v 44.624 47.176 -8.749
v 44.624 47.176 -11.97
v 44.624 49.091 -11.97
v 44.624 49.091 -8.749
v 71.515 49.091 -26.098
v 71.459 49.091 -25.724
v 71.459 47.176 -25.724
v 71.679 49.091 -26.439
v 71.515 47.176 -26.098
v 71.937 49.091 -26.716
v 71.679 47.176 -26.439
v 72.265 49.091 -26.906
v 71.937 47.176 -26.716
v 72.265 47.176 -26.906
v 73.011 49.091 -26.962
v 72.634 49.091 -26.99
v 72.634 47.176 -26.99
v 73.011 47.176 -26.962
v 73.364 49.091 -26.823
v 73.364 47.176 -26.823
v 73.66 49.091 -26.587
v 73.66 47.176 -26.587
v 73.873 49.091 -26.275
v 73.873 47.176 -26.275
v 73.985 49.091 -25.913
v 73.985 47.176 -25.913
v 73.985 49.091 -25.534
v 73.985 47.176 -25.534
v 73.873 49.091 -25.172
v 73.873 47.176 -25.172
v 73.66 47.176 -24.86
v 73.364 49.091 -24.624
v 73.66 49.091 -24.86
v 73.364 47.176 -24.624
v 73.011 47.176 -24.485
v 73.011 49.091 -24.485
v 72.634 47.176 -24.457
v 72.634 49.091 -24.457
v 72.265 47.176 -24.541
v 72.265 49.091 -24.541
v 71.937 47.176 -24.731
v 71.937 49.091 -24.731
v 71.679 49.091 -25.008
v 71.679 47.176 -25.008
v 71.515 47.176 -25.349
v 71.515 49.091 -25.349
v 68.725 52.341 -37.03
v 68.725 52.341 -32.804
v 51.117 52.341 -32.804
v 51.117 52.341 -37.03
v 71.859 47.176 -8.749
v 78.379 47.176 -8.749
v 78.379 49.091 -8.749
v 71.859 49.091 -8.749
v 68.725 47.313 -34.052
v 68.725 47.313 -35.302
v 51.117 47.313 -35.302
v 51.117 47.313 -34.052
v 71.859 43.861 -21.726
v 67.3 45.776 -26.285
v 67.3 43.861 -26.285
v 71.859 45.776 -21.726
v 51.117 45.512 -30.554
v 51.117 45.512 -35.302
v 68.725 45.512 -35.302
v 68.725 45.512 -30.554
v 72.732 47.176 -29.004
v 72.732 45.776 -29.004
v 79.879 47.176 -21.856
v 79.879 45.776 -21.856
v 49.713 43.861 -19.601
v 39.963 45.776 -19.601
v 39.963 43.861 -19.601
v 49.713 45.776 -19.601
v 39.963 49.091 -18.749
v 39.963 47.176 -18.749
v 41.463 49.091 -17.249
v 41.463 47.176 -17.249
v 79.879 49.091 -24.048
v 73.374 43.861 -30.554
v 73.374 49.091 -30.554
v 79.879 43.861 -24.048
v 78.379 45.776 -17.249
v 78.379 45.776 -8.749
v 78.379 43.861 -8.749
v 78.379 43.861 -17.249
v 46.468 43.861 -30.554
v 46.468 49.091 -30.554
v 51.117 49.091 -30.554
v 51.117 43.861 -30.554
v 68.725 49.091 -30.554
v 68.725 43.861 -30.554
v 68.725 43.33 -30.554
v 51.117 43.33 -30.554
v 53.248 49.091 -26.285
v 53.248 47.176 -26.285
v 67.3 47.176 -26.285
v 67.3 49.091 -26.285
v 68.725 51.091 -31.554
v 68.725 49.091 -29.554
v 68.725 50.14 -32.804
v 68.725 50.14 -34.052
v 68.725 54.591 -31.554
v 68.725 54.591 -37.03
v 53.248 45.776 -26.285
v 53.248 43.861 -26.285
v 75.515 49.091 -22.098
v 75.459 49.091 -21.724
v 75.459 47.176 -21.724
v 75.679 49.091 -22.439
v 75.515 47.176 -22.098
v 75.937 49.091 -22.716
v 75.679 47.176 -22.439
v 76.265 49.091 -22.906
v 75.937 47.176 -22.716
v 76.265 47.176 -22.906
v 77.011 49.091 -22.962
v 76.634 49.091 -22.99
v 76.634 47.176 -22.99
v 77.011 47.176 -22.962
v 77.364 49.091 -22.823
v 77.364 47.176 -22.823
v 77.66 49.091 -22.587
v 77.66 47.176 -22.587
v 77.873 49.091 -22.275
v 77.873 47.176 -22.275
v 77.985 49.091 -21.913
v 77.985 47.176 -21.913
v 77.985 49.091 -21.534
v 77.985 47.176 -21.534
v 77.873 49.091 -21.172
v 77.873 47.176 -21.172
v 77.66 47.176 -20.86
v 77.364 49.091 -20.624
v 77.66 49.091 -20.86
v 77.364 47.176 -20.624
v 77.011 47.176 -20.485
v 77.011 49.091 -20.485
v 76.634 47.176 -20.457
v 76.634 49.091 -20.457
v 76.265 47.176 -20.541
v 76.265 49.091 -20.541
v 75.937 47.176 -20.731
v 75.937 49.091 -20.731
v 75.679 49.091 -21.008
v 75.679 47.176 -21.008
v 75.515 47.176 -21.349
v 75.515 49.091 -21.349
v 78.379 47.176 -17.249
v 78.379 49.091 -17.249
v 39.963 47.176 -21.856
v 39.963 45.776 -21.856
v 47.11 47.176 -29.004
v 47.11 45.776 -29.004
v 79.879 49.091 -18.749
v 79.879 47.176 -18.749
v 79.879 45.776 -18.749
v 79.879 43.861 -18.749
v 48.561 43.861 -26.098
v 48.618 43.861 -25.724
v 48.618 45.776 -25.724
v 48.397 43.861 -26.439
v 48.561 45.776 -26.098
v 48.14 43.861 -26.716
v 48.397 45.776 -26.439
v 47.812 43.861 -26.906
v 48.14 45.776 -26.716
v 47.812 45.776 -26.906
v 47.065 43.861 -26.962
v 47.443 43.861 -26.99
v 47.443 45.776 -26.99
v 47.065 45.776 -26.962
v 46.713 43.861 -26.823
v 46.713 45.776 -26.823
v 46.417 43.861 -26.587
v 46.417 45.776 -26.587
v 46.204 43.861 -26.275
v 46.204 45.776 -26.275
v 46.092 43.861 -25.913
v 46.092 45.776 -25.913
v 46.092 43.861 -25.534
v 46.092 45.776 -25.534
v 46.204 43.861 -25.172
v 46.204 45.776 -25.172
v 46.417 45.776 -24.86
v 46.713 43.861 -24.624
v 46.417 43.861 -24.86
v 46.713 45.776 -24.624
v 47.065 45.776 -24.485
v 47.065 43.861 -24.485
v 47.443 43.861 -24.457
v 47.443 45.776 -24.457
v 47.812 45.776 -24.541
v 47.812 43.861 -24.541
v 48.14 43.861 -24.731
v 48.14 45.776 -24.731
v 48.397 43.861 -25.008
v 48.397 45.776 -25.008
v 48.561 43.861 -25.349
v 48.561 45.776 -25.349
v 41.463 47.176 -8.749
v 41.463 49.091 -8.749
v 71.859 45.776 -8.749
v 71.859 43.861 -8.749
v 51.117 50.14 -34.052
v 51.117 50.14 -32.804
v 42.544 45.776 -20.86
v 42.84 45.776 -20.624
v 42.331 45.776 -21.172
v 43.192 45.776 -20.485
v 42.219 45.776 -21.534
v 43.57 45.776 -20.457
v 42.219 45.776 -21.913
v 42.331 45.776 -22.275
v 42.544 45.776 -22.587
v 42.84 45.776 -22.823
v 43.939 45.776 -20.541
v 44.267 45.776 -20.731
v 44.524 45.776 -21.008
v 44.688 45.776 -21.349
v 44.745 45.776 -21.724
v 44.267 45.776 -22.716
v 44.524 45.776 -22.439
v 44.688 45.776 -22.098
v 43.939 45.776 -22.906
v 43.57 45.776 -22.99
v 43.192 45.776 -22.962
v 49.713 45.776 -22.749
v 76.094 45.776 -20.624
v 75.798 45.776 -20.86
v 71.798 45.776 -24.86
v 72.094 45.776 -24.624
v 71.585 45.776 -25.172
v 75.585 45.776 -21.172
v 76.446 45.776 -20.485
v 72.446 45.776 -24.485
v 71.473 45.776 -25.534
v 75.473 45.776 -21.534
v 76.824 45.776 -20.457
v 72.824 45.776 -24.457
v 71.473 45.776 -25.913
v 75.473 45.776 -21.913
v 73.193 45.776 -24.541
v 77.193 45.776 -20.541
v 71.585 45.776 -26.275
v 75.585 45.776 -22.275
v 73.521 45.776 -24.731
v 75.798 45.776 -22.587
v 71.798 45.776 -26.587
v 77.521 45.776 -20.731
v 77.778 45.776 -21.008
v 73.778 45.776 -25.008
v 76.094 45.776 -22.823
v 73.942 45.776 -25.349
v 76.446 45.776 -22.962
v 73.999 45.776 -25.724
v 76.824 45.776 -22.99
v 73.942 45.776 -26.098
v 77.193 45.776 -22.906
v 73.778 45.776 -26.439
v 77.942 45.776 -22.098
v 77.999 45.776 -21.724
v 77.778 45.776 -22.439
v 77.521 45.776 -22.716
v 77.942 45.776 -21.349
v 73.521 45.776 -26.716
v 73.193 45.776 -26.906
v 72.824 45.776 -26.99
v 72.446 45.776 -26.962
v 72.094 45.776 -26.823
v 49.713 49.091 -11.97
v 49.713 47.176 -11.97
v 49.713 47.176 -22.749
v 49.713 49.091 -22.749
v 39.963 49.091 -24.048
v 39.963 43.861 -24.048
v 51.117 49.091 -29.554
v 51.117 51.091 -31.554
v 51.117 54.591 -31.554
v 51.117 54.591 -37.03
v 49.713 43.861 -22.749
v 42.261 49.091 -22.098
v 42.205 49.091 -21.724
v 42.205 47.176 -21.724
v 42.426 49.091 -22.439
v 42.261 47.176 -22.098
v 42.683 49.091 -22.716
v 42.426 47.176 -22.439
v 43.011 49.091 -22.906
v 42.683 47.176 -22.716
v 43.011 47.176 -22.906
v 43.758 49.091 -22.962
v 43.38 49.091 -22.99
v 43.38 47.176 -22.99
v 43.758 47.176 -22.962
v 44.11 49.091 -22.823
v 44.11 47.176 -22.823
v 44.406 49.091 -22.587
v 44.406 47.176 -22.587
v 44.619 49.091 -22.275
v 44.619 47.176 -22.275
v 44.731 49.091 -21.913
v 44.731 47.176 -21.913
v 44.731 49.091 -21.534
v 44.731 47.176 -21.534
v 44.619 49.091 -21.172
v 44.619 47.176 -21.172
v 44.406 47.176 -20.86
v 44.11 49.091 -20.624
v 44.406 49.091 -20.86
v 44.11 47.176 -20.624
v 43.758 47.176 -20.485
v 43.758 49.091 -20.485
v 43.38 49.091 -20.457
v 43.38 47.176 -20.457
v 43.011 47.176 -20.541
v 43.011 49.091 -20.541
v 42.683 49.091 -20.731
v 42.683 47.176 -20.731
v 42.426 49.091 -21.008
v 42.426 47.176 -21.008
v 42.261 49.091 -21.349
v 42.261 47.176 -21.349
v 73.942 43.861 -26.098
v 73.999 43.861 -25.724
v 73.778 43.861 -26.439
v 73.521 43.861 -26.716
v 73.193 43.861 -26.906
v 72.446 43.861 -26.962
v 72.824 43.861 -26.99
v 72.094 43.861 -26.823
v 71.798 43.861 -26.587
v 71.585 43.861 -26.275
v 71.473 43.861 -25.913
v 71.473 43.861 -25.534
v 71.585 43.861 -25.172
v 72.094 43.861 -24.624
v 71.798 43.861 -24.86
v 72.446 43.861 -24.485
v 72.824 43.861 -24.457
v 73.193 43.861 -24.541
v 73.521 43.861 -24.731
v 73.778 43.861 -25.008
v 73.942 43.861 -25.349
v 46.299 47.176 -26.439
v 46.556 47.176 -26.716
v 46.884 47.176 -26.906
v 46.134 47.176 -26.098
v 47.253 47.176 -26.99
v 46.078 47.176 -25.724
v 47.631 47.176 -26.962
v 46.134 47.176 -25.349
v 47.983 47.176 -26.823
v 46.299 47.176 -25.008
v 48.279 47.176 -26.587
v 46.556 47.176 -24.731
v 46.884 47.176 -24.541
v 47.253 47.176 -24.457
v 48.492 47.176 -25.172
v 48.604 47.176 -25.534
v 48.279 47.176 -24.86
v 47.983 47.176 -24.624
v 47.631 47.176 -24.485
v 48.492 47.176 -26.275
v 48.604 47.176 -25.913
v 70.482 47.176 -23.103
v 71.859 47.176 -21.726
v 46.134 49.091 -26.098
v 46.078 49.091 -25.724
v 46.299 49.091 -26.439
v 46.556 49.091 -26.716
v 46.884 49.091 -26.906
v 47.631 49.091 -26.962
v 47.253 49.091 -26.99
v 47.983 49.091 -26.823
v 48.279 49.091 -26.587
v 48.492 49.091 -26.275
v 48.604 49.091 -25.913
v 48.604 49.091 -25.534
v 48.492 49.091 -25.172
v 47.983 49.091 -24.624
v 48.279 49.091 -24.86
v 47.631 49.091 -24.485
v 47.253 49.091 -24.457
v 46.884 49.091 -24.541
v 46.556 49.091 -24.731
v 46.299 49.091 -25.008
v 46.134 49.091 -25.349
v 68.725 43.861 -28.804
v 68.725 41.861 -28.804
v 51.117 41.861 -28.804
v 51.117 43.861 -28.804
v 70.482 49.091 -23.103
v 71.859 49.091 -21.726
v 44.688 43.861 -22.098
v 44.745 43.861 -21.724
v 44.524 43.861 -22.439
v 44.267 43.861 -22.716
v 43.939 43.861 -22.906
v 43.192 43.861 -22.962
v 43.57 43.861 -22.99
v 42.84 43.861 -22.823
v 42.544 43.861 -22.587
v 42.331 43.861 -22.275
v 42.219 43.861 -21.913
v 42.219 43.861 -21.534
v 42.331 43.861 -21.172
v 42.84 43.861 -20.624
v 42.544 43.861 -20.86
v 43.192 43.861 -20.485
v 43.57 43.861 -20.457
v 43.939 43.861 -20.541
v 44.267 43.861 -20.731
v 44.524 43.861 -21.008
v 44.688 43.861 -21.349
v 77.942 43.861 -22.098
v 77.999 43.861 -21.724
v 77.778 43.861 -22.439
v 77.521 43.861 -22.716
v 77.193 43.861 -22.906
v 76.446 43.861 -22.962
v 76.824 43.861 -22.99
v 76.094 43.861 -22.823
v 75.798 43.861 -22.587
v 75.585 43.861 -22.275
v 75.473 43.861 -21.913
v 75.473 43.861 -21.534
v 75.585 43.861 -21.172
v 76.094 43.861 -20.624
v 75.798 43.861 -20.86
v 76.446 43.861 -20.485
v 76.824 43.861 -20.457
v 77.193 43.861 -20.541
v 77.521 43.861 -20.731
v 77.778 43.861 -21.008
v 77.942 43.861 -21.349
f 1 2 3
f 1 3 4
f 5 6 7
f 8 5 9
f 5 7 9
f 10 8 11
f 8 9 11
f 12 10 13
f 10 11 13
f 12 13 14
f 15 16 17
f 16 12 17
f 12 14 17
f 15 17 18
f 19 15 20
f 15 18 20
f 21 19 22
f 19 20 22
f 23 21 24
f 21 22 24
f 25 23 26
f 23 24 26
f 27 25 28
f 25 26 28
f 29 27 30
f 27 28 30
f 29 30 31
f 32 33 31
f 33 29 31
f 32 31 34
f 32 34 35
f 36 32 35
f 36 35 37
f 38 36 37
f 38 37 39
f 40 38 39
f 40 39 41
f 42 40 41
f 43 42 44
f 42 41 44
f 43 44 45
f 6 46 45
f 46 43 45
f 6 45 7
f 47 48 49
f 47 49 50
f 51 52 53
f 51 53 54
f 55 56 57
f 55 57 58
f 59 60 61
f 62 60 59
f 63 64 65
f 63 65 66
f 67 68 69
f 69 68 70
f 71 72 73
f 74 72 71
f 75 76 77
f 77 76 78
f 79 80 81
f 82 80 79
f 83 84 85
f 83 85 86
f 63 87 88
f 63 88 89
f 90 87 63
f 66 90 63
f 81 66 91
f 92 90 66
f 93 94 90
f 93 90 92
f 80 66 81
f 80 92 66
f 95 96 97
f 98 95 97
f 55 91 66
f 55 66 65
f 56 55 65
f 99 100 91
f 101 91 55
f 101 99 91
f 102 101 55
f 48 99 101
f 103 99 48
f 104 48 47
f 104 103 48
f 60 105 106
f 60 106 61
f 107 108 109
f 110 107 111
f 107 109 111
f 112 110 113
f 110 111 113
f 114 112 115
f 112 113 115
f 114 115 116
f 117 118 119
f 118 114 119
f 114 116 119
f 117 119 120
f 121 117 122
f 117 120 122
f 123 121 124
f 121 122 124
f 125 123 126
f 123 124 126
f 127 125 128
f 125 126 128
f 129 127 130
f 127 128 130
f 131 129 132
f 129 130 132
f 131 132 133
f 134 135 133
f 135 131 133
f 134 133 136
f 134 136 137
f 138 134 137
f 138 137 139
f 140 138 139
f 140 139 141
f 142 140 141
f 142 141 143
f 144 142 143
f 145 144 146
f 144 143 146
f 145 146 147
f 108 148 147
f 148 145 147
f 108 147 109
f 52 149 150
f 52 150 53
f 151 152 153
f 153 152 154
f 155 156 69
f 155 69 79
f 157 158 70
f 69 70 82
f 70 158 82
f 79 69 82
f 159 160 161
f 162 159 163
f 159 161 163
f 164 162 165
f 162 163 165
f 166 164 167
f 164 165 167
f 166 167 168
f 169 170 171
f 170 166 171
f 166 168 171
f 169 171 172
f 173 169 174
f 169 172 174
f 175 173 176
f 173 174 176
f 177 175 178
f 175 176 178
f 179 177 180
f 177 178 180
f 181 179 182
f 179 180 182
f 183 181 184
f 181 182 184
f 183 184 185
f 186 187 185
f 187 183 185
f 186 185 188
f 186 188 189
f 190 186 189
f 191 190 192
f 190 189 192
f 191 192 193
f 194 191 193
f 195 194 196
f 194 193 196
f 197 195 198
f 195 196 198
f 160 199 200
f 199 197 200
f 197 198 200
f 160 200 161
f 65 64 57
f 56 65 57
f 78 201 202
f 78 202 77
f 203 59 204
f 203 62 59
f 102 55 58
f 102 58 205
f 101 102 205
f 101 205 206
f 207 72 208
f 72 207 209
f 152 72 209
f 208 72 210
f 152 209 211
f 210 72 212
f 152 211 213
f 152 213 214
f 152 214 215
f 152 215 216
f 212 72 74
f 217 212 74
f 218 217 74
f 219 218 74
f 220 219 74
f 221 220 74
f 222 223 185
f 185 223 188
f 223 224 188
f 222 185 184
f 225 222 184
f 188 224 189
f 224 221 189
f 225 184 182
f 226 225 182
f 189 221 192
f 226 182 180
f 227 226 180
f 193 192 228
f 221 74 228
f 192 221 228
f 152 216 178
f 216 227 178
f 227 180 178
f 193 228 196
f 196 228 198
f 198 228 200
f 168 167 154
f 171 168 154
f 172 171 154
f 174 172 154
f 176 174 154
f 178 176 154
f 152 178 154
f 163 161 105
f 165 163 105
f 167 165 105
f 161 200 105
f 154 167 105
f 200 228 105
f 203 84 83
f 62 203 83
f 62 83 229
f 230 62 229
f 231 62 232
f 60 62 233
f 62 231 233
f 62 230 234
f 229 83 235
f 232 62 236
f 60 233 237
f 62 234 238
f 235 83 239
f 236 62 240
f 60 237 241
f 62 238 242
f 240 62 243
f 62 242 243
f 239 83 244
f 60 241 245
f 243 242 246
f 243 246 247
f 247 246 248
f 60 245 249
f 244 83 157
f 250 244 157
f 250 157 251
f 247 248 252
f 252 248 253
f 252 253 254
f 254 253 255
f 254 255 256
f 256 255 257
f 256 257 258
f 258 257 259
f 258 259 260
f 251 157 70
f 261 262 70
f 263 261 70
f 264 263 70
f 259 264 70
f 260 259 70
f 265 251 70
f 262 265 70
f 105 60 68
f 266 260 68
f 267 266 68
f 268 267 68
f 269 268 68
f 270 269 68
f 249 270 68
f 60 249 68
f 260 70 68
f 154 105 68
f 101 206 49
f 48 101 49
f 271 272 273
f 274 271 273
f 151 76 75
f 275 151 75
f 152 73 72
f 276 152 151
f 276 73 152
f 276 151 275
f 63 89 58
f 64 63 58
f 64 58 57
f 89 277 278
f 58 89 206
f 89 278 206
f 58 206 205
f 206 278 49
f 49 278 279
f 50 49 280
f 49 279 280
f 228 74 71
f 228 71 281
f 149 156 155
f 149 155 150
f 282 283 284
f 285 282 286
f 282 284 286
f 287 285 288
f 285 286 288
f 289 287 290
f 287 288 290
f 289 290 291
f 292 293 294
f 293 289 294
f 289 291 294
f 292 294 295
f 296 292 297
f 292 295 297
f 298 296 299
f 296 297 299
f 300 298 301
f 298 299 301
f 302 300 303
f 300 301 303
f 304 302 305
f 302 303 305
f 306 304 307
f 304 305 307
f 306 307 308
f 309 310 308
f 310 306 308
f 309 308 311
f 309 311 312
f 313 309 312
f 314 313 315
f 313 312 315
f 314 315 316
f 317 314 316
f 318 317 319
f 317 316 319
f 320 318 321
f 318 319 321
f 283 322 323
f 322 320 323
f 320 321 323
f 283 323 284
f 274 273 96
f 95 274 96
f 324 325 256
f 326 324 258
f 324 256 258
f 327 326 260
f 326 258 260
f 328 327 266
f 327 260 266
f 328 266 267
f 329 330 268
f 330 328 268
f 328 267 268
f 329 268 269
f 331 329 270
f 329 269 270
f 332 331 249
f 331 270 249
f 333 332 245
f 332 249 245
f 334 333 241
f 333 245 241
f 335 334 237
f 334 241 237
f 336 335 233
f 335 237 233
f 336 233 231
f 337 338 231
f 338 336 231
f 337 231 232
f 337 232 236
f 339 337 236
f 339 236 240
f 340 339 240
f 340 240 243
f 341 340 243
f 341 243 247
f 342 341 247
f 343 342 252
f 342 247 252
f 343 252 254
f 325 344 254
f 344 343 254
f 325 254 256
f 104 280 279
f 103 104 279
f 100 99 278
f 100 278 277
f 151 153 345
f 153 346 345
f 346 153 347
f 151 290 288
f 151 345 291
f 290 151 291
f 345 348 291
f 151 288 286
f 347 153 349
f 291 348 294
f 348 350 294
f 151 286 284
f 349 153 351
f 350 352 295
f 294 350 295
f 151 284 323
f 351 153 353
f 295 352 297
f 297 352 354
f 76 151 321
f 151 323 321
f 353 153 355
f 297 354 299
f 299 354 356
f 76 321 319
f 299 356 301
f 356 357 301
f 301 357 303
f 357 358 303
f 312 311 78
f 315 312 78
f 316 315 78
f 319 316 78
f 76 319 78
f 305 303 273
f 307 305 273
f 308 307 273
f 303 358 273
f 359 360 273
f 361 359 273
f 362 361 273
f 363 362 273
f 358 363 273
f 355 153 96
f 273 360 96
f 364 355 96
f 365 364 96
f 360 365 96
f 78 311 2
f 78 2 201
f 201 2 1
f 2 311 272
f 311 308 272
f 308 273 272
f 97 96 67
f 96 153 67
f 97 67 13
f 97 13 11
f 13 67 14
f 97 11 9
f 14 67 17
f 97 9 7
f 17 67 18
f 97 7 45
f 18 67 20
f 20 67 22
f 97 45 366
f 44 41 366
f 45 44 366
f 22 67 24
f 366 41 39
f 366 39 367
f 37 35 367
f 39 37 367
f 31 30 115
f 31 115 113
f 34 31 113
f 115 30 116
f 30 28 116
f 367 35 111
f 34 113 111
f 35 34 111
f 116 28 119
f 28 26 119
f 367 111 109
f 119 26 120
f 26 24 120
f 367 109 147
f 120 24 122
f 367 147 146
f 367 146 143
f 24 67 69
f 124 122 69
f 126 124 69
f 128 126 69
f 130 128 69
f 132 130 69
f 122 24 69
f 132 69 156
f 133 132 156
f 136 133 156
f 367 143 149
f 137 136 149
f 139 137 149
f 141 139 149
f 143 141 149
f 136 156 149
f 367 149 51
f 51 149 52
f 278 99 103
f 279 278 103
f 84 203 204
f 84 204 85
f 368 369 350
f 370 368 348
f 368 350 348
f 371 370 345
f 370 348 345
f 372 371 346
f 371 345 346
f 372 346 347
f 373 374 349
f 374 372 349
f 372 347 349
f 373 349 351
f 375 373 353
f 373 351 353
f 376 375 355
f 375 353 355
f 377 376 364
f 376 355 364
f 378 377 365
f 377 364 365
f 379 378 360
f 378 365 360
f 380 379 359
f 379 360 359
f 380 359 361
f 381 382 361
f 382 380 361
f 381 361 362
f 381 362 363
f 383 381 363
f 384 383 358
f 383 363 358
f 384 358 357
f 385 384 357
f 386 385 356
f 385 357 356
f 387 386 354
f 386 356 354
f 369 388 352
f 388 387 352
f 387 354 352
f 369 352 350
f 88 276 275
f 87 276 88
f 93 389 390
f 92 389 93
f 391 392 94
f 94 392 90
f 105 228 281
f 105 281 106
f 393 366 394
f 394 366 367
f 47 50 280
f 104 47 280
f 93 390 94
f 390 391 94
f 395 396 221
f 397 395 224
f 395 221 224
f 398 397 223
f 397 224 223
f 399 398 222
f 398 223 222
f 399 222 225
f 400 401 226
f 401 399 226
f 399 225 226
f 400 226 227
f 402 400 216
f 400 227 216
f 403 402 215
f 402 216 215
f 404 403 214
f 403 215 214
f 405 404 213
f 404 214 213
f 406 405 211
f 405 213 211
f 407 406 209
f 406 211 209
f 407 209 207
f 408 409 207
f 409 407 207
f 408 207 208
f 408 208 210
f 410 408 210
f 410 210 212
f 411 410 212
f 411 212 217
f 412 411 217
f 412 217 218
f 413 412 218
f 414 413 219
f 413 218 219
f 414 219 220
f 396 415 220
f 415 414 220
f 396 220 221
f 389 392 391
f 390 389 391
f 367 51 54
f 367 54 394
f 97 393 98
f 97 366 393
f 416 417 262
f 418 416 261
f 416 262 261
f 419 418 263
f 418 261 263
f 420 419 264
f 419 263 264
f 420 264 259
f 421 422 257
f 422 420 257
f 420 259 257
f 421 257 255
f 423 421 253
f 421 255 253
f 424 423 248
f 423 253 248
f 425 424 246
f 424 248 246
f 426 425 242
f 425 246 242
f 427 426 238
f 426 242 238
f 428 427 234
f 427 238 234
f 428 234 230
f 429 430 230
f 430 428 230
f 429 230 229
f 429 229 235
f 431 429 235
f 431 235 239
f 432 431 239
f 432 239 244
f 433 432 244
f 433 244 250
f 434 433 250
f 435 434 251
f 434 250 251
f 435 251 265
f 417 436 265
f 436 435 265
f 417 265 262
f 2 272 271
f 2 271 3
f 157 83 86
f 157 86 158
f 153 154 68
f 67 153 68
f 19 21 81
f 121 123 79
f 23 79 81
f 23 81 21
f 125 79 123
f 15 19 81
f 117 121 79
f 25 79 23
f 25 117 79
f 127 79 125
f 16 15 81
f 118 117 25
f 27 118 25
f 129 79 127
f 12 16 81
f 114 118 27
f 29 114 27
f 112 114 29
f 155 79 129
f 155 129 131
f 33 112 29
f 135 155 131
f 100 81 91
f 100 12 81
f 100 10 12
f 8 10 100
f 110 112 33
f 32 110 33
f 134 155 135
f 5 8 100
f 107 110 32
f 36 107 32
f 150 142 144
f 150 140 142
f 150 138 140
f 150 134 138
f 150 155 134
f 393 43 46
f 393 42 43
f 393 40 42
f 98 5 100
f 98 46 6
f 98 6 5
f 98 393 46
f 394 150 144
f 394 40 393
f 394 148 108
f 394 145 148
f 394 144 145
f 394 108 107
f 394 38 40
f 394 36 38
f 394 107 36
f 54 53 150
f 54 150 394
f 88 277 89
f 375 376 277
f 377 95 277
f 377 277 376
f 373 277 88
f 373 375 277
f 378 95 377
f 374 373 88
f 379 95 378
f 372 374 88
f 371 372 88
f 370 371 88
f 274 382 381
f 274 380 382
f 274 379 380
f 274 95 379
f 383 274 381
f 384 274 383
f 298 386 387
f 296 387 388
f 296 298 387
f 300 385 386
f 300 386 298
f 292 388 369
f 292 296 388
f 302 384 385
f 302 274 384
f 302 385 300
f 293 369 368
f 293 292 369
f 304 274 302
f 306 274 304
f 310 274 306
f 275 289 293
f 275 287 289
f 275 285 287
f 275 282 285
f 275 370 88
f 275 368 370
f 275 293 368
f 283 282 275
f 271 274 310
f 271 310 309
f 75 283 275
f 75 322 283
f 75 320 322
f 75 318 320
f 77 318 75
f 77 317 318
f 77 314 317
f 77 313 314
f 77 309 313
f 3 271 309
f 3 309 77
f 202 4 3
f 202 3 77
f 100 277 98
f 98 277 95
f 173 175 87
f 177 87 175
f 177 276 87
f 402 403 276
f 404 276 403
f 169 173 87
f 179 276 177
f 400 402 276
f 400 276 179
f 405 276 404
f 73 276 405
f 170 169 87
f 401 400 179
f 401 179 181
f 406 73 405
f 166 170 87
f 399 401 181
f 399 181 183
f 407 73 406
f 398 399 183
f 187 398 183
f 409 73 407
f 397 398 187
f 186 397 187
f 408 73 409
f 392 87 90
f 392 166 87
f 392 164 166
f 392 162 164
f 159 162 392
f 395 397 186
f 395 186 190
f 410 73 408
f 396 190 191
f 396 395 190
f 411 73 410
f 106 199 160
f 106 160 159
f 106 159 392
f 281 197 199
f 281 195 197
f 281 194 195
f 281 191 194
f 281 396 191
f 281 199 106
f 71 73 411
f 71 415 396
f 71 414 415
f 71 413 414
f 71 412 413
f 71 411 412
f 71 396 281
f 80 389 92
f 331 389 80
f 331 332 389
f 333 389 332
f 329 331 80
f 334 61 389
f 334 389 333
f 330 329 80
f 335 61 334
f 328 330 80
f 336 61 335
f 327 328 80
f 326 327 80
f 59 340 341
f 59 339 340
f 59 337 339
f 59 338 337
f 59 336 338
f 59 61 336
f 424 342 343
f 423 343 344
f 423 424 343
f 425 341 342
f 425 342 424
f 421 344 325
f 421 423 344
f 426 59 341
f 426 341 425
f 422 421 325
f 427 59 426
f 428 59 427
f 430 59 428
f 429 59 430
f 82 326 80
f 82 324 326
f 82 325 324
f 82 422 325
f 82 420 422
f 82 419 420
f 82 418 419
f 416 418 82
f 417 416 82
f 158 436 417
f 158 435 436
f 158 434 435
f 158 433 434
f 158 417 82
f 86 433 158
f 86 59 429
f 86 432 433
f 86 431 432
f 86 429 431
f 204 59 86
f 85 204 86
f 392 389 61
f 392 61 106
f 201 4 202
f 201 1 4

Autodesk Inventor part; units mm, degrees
ref_plane "Work Plane1" through (59.9208, 47.0911, 21.911) normal (0, 1, 0) x (-1, 0, 0)
sketch "Sketch1" plane through (59.9208, 47.0911, 21.911) normal (0, 1, 0) x (-1, 0, 0)
  circle A0 centre (-16.808, -43.6345) radius 1.27
  circle A1 centre (12.5729, -47.6345) radius 1.27
  circle A2 centre (16.4459, -43.6345) radius 1.27
  circle A3 centre (-12.808, -47.6345) radius 1.27
  line L0 (10.208, -33.8805) -> (10.208, -44.6601)
  line L1 (10.208, -44.6601) -> (6.6725, -48.1956)
  circle A4 centre (-16.808, -43.6345) radius 1.27 projected
  circle A5 centre (12.5729, -47.6345) radius 1.27 projected
  circle A6 centre (16.4459, -43.6345) radius 1.27 projected
  circle A7 centre (-12.8081, -47.6345) radius 1.27 projected
  line L2 (19.708, -15.6655) -> (-19.708, -15.6655)
  line L3 (0, -15.6655) -> (0, -20.8781)
  line L4 (6.6725, -48.1956) -> (-7.3796, -48.1956)
  line L5 (-19.958, -43.8381) -> (-12.8316, -50.9645)
  line L6 (-12.8316, -50.9645) -> (12.8316, -50.9645)
  line L7 (-19.958, -40.6601) -> (-19.958, -43.8381)
  line L8 (0, -48.1956) -> (0, -46.7038)
  line L9 (19.958, -43.8381) -> (12.8316, -50.9645)
  line L10 (19.958, -40.6601) -> (19.958, -43.8381)
  line L11 (-11.938, -30.6601) -> (-11.938, -43.6372)
  line L12 (-10.5616, -45.0137) -> (-11.938, -43.6372)
  line L13 (-10.5616, -45.0137) -> (-7.3796, -48.1956)
  line L14 (15.2967, -30.6601) -> (18.458, -30.6601)
  line L15 (18.458, -30.6601) -> (18.458, -39.1601)
  line L16 (-18.458, -39.1601) -> (-18.458, -30.6601)
  line L17 (-18.458, -30.6601) -> (-11.938, -30.6601)
  line L18 (10.208, -33.8805) -> (15.2967, -33.8805)
  line L19 (15.2967, -33.8805) -> (15.2967, -30.6601)
  line L20 (-19.958, -40.6601) -> (-18.458, -39.1601)
  line L21 (19.958, -40.6601) -> (18.458, -39.1601)
  point P0 (-19.708, -43.6601)
  point P1 (-6.6725, -48.1956)
  dimension "d14" = 5
  dimension "d15" = 135
  dimension "d18" = 2.54
extrude "Extrusion1" add sketch "Sketch1" along normal blind 2
ref_plane "Work Plane2" through (59.9208, 45.8611, 21.911) normal (0, -1, 0) x (1, 0, 0)
sketch "Sketch2" plane through (59.9208, 45.8611, 21.911) normal (0, -1, 0) x (1, 0, 0)
  line L0 (-10.208, -33.8805) -> (-10.208, -44.6601) projected
  line L1 (-10.208, -44.6601) -> (-6.6725, -48.1956) projected
  line L2 (-6.6725, -48.1956) -> (7.3796, -48.1956) projected
  circle A0 centre (16.808, -43.6345) radius 1.27 projected
  circle A1 centre (-12.5729, -47.6345) radius 1.27 projected
  circle A2 centre (-16.4459, -43.6345) radius 1.27 projected
  circle A3 centre (12.808, -47.6345) radius 1.27 projected
  line L3 (19.958, -40.6601) -> (19.958, -43.8381) projected
  line L4 (19.958, -43.8381) -> (12.8316, -50.9645) projected
  line L5 (12.8316, -50.9645) -> (-12.8316, -50.9645) projected
  line L6 (-12.8316, -50.9645) -> (-19.958, -43.8381) projected
  line L7 (-19.958, -43.8381) -> (-19.958, -40.6601) projected
  line L8 (7.3796, -48.1956) -> (11.938, -43.6372) projected
  line L9 (11.938, -43.6372) -> (11.938, -30.6601) projected
  line L10 (11.938, -30.6601) -> (18.458, -30.6601) projected
  line L11 (18.458, -30.6601) -> (18.458, -39.1601) projected
  line L12 (-18.458, -39.1601) -> (-18.458, -30.6601) projected
  line L13 (-18.458, -30.6601) -> (-15.2967, -30.6601) projected
  line L14 (-15.2967, -30.6601) -> (-15.2967, -33.8805) projected
  line L15 (-15.2967, -33.8805) -> (-10.208, -33.8805) projected
  line L16 (18.458, -39.1601) -> (19.958, -40.6601) projected
  line L17 (-19.958, -40.6601) -> (-18.458, -39.1601) projected
  circle A4 centre (-16.4459, -43.6345) radius 1.27 projected
  line L18 (-19.958, -43.8381) -> (-19.958, -40.6601) projected
  line L19 (-19.958, -41.5123) -> (-10.208, -41.5123)
  line L20 (-10.208, -33.8805) -> (-10.208, -44.6601) projected
  point P0 (-59.9208, -21.911)
extrude "Extrusion2" add sketch "Sketch2" along normal blind 2 contours L0 L1 L2 L8 L9 L10 L11 L16 L3 L4 L5 L6 L7 L19
sketch "Sketch4" plane through (79.8789, 45.8611, -18.7491) normal (1, 0, 0) x (0, 0, -1)
  line L0 (0, 1.23) -> (3.178, 1.23) projected
  line L1 (0, 0) -> (-1.5, 0) projected
  line L2 (0, 1.23) -> (0, 0)
  line L3 (-12.1065, -0.085) -> (12.1065, -0.085)
  line L4 (12.1065, -0.085) -> (12.1065, 1.315)
  line L5 (12.1065, 1.315) -> (-12.1065, 1.315)
  line L6 (-12.1065, 1.315) -> (-12.1065, -0.085)
  line L7 (-12.1065, -0.085) -> (12.1065, 1.315) construction
  line L8 (12.1065, -0.085) -> (-12.1065, 1.315) construction
  point P0 (0, 0.615)
  dimension "d73" = 1.4
extrude "Extrusion3" cut sketch "Sketch4" against normal through all
sketch "Sketch5" plane through (59.9208, 43.8611, 21.911) normal (0, -1, 0) x (1, 0, 0)
  line L0 (-19.708, -43.6601) -> (-19.708, -40.6601)
  line L1 (-12.6424, -50.7145) -> (-19.708, -43.6601)
  line L2 (12.728, -50.7145) -> (-12.6424, -50.7145)
  line L3 (19.708, -43.7345) -> (12.728, -50.7145)
  line L4 (-13.4529, -52.4645) -> (13.4529, -52.4645)
  line L5 (19.708, -43.7345) -> (19.708, -40.6601)
  line L6 (-12.8316, -50.9145) -> (12.8316, -50.9145)
  line L7 (12.8316, -50.9645) -> (11.3316, -52.4645)
  line L8 (-19.958, -43.8381) -> (-12.8316, -50.9645)
  line L9 (-12.8316, -50.9645) -> (-11.3316, -52.4645)
  line L10 (-12.8316, -50.9645) -> (-10.7103, -50.9645) construction
  line L11 (12.8316, -50.9145) -> (12.8816, -50.9145)
  line L12 (-12.8316, -50.9645) -> (12.8316, -50.9645)
  line L13 (12.8316, -50.9645) -> (12.8816, -50.9145)
  line L14 (12.8316, -50.9645) -> (19.958, -43.8381)
  line L15 (-12.8316, -50.9145) -> (-12.8816, -50.9145)
  line L16 (-12.8316, -50.9645) -> (-12.8816, -50.9145)
  line L17 (12.8109, -50.9145) -> (19.958, -43.7673)
  line L18 (-19.958, -43.7673) -> (-12.8109, -50.9145)
  line L19 (-19.958, -45.9594) -> (-13.4529, -52.4645)
  line L20 (13.4529, -52.4645) -> (19.958, -45.9594)
  line L21 (-19.958, -43.7673) -> (-19.958, -45.9594)
  line L22 (12.8316, -50.9645) -> (19.958, -43.8381) projected
  line L23 (19.958, -43.8381) -> (19.958, -45.9594)
  line L24 (19.958, -43.8381) -> (19.958, -43.7673)
  line L25 (19.958, -43.8381) -> (19.958, -40.6601) projected
  dimension "d29" = 0.2
  dimension "d62" = 45
  dimension "d74" = 0.05
  dimension "d75" = 0.05
  dimension "d76" = 1.5
  dimension "d77" = 1.5
extrude "Extrusion4" add sketch "Sketch5" against normal up to surface (5.23 mm away)
ref_plane "Work Plane13" through (59.9208, 43.8611, -18.7491) normal (1, 0, 0) x (0, 0, -1)
ref_plane "Work Plane14" through (53.2483, 46.4761, -26.2847) normal (0, 1, 0) x (1, 0, 0)
sketch "Sketch18" plane through (59.9208, 43.8611, -18.7491) normal (1, 0, 0) x (0, 0, -1)
  line L0 (12.8044, 1.651) -> (16.5534, 1.651)
  line L1 (16.5534, 1.651) -> (16.5534, 3.4515)
  line L2 (16.5534, 3.4515) -> (15.3033, 3.4515)
  line L3 (15.3033, 3.4515) -> (15.3033, 6.2794)
  line L4 (15.3033, 6.2794) -> (14.0544, 6.2794)
  line L5 (14.0544, 6.2794) -> (14.0544, 8.48)
  line L6 (14.0544, 8.48) -> (18.2804, 8.48)
  line L7 (18.2804, 8.48) -> (18.2804, 10.73)
  line L8 (18.2804, 10.73) -> (12.8044, 10.73)
  line L9 (12.8044, 7.23) -> (12.8044, 10.73)
  line L10 (11.8044, 0) -> (11.8044, 5.23) projected
  line L11 (11.8044, 5.23) -> (11.8044, 0)
  line L12 (11.8044, 5.23) -> (10.8044, 5.23)
  line L13 (12.8044, 1.651) -> (11.8044, 1.651)
  line L14 (12.8044, 7.23) -> (10.8044, 5.23)
  line L15 (11.8044, 0) -> (10.0544, 0)
  line L16 (10.0544, 0) -> (10.0544, -2)
  line L17 (10.0544, -2) -> (11.8044, -0.5316)
  line L18 (11.8044, -0.5316) -> (11.8044, 0)
  point P0 (12.8044, 5.23)
  point P1 (11.8044, 1.651)
  dimension "d182" = 2
  dimension "d183" = 2
  dimension "d184" = 1.75
  dimension "d185" = 2
  dimension "d186" = 50
extrude "Extrusion12" add sketch "Sketch18" along normal blind 8.804 and the other way blind 8.804
ref_plane "Work Plane19" through (51.1168, 52.1911, -37.0296) normal (0, -1, 0) x (1, 0, 0)
ref_plane "Work Plane20" through (68.7248, 50.1406, -34.2524) normal (0, 0, -1) x (-1, 0, 0)
properties part number "Button Holder"
